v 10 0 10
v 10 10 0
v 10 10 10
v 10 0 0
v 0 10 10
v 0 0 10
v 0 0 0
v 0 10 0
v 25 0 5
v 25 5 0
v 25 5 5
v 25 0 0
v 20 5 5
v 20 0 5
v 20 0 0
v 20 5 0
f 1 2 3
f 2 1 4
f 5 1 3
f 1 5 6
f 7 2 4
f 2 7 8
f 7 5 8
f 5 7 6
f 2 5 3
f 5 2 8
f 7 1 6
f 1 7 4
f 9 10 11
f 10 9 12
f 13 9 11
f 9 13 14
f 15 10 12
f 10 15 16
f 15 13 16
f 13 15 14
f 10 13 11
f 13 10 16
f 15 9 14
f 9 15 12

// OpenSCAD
color("red") { cube(10); color("blue") translate([2,2,2]) cube(6); translate([20,0,0]) cube(5); }
